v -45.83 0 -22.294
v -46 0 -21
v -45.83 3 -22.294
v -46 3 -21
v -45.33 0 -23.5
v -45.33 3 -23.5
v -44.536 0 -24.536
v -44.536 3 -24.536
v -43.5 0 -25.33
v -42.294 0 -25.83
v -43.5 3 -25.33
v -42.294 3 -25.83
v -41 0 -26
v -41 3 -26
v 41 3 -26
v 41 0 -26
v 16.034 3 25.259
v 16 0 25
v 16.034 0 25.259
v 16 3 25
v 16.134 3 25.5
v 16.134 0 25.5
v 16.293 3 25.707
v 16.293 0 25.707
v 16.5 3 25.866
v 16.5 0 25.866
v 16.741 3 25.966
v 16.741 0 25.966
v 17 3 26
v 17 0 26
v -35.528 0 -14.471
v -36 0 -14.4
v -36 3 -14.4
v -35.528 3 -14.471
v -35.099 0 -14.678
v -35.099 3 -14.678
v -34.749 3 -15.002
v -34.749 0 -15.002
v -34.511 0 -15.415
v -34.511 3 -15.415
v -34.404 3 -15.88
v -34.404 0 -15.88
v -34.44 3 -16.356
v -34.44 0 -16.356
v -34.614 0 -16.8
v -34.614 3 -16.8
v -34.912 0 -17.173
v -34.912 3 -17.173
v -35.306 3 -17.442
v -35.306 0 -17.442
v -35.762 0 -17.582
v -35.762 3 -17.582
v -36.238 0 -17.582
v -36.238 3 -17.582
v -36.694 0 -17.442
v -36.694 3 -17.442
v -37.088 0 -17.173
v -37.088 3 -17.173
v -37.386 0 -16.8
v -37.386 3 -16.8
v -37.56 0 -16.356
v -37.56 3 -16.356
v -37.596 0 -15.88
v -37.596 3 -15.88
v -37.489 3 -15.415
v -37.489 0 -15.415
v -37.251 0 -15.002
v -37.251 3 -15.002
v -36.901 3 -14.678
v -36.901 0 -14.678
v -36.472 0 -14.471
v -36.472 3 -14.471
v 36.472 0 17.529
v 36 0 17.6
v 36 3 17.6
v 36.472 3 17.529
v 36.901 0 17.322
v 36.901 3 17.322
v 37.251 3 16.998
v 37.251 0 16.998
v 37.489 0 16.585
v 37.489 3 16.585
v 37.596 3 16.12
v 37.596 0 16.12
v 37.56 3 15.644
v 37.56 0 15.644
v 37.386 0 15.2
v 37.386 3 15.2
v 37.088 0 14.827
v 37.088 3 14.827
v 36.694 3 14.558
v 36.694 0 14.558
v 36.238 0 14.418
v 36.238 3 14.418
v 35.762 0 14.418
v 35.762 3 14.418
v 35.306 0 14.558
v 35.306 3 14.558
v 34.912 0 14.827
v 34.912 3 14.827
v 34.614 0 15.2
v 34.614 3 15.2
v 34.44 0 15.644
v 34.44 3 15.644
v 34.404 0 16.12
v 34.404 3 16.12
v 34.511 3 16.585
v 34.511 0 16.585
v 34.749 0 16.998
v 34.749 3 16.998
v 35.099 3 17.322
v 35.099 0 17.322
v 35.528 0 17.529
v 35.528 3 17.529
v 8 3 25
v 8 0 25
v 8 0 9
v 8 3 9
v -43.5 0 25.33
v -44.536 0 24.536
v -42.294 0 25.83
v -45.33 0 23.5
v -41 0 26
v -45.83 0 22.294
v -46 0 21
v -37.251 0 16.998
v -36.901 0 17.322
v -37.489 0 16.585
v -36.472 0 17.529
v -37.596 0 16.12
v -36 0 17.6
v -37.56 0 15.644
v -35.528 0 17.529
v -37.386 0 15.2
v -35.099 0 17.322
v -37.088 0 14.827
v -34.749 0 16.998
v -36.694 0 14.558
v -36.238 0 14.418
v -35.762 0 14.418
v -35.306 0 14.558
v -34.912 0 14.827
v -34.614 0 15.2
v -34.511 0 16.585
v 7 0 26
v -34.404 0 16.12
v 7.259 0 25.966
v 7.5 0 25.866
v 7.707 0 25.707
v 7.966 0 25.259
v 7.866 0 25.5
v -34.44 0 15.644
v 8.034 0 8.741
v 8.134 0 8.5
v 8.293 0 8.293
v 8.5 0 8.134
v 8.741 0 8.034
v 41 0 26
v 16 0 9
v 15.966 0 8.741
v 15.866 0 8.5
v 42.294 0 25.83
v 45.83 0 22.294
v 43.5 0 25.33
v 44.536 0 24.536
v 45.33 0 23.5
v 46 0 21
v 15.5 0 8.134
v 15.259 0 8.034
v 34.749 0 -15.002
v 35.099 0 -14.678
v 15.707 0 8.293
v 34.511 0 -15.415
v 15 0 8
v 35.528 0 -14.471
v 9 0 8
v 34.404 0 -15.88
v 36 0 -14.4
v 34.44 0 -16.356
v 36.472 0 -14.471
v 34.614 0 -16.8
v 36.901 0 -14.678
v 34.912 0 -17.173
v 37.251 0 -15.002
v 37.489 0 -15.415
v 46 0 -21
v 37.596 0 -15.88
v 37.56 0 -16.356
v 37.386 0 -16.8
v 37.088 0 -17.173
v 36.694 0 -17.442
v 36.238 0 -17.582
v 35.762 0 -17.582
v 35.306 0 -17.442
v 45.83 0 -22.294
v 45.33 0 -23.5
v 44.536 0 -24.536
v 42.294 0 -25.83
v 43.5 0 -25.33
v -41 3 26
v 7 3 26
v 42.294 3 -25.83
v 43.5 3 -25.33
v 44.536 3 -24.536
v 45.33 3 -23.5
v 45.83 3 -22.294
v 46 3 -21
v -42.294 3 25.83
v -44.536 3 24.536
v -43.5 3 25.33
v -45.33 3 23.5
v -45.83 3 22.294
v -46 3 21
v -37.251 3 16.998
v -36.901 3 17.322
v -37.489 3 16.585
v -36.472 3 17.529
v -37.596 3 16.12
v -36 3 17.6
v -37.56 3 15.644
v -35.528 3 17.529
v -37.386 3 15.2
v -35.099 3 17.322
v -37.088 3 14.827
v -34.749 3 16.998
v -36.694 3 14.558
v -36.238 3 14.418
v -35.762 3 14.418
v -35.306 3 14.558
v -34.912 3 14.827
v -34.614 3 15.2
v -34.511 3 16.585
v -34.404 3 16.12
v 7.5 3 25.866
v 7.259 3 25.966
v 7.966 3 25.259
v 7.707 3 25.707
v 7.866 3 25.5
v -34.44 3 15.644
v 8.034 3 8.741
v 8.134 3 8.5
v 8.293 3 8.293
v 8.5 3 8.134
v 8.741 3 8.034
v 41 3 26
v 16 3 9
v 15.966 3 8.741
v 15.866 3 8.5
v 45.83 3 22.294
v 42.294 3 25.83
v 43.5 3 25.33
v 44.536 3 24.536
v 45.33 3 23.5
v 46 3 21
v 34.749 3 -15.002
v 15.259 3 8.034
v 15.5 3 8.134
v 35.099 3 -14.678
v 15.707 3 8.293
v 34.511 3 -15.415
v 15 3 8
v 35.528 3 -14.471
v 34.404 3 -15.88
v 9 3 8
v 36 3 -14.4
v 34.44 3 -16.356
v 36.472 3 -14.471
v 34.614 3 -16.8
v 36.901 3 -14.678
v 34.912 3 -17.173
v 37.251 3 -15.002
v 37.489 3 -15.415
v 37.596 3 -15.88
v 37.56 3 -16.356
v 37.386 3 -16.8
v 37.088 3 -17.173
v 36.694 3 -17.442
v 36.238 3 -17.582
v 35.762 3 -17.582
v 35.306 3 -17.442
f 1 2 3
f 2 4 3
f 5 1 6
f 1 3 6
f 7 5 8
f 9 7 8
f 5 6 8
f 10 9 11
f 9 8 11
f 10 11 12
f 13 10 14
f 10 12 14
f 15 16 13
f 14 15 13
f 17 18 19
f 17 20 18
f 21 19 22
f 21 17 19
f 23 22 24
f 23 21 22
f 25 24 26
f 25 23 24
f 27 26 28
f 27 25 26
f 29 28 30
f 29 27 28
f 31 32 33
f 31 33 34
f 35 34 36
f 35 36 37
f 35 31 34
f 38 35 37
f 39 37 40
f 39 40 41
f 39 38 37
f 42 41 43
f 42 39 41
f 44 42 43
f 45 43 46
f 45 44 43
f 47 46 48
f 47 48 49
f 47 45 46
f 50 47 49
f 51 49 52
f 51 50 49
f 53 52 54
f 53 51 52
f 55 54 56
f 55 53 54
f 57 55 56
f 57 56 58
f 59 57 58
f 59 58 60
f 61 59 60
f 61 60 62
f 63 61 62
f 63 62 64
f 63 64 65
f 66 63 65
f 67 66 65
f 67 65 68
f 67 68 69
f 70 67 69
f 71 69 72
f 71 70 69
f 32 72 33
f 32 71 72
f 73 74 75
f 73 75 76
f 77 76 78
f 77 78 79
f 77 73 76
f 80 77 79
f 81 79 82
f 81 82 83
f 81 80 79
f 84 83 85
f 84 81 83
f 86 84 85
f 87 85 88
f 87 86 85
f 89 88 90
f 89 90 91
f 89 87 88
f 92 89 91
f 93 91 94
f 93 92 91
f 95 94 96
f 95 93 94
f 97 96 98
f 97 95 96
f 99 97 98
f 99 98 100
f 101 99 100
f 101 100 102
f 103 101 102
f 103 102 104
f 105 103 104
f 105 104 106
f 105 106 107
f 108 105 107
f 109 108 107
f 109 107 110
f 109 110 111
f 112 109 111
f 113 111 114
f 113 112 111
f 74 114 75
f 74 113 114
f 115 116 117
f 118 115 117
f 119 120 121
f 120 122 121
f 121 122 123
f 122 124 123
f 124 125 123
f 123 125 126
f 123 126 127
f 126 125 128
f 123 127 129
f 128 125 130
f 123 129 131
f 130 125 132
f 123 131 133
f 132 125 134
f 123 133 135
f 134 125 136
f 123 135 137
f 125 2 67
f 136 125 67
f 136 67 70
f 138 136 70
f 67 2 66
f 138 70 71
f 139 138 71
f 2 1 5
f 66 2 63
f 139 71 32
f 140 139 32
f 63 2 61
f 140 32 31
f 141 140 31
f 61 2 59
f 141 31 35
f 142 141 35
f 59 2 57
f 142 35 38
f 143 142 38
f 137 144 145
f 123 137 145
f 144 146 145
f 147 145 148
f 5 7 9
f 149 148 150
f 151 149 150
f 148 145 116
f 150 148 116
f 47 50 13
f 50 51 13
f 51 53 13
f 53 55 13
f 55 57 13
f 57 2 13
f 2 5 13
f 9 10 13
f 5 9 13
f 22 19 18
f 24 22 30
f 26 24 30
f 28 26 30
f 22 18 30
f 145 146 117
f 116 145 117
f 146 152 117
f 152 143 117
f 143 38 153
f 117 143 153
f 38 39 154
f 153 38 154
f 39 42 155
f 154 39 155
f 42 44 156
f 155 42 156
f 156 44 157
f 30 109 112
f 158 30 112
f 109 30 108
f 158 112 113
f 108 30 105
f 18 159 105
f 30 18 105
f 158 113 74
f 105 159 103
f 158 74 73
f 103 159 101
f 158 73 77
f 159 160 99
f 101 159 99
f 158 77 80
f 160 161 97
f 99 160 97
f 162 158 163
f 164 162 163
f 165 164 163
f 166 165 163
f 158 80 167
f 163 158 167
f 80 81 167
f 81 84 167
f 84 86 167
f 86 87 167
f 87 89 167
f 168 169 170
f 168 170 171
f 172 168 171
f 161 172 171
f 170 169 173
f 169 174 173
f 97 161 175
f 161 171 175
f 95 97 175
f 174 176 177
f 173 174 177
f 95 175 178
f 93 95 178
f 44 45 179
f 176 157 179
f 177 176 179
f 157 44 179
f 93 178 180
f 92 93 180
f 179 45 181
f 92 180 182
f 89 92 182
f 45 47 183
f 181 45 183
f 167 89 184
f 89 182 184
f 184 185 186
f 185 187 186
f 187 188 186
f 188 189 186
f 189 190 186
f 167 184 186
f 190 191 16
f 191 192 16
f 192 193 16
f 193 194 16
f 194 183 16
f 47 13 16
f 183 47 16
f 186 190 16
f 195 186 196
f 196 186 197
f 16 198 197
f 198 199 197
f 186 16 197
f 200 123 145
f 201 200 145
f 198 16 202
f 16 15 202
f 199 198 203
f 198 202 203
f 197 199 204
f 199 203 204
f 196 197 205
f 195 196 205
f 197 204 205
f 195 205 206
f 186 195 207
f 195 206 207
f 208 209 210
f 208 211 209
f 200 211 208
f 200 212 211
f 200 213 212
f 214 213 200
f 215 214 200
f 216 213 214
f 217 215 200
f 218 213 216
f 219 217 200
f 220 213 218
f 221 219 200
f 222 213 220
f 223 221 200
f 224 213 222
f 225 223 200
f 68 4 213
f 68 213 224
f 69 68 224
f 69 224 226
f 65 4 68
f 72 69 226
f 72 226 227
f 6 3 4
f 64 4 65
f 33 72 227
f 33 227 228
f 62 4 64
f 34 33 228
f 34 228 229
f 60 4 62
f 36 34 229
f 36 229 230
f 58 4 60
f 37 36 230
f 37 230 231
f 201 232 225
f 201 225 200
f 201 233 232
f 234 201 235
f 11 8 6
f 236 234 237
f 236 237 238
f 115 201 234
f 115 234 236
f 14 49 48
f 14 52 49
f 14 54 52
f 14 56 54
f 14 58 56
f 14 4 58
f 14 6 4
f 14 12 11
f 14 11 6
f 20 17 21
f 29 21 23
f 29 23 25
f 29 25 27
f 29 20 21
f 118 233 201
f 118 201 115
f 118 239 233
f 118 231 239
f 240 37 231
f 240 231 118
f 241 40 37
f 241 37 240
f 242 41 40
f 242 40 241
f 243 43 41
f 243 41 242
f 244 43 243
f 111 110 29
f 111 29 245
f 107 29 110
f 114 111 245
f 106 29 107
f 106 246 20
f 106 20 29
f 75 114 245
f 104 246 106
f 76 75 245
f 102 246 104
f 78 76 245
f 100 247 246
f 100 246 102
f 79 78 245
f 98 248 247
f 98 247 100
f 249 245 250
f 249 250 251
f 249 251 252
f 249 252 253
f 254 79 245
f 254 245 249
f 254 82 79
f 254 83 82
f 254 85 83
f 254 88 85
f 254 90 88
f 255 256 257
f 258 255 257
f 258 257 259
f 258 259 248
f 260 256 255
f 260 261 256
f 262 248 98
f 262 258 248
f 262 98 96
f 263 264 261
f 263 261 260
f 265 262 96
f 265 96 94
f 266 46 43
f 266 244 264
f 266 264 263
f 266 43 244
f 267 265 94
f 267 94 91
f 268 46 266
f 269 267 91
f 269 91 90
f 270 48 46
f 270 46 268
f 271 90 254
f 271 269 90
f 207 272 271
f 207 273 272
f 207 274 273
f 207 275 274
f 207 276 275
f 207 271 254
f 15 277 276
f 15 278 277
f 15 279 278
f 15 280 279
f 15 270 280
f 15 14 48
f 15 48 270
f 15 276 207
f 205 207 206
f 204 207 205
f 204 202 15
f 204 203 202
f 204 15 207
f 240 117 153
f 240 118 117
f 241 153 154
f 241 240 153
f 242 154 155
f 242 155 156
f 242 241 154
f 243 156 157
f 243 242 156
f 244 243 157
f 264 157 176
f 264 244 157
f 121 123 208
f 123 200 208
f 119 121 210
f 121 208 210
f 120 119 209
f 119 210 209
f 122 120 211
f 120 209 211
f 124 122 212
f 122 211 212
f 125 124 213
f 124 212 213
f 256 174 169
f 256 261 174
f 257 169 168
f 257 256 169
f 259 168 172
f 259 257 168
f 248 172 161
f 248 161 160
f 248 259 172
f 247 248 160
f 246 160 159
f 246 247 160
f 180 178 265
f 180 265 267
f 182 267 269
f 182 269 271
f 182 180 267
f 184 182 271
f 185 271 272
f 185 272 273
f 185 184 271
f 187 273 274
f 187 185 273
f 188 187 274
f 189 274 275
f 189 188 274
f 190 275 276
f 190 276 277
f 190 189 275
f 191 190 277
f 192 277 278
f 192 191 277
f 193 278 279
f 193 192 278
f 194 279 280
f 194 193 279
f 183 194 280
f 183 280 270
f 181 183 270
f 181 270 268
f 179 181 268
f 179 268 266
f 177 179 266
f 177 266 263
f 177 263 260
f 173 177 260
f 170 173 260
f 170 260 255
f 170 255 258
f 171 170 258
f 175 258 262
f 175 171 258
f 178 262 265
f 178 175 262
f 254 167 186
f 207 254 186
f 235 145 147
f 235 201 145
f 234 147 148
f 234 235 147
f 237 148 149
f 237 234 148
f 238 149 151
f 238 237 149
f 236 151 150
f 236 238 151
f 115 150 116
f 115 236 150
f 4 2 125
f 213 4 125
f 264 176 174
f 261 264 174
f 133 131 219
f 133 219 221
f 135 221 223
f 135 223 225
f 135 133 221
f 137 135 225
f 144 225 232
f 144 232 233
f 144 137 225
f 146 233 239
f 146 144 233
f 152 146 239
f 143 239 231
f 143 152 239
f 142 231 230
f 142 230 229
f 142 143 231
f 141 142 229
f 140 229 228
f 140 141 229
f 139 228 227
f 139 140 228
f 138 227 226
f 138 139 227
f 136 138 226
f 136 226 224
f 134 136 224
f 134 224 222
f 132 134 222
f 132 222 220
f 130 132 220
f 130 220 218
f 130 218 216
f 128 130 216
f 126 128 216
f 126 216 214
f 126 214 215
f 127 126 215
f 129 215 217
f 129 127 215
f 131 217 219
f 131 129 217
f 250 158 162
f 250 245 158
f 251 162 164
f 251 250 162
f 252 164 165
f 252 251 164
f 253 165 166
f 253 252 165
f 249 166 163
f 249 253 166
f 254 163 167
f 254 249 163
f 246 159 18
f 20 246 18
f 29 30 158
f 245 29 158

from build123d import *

# Parameters (mm, degrees)
SKETCH_1_R      = 1.6
EXTRUDE_1_DEPTH = 3
FILLET_1_R      = 5
FILLET_2_R      = 1


with BuildPart() as part:
    # 草图1 → 凸台-拉伸1 (new body)
    with BuildSketch(Plane(origin=(0, 0, 0), x_dir=(1, 0, 0), z_dir=(0, 1, 0))):
        Polygon((8, -26), (8, -8), (16, -8), (16, -26), (46, -26), (46, 26), (-46, 26), (-46, -26), align=None)
        with Locations(Location((-36, 16, 0), (0, 0, 270))):
            Circle(SKETCH_1_R, mode=Mode.SUBTRACT)
        with Locations(Location((-36, -16, 0), (0, 0, 270))):
            Circle(SKETCH_1_R, mode=Mode.SUBTRACT)
        with Locations(Location((36, -16, 0), (0, 0, 270))):
            Circle(SKETCH_1_R, mode=Mode.SUBTRACT)
        with Locations(Location((36, 16, 0), (0, 0, 270))):
            Circle(SKETCH_1_R, mode=Mode.SUBTRACT)
    extrude(amount=EXTRUDE_1_DEPTH)

    # 圆角1
    fillet_1_edges = [part.edges().sort_by_distance(p)[0] for p in [
        (-46, 1.5, 26),
        (-46, 1.5, -26),
        (46, 1.5, -26),
        (46, 1.5, 26),
    ]]
    fillet(fillet_1_edges, radius=FILLET_1_R)

    # 圆角2
    fillet_2_edges = [part.edges().sort_by_distance(p)[0] for p in [
        (16, 1.5, 26),
        (16, 1.5, 8),
        (8, 1.5, 8),
        (8, 1.5, 26),
    ]]
    fillet(fillet_2_edges, radius=FILLET_2_R)


solid = part.part
